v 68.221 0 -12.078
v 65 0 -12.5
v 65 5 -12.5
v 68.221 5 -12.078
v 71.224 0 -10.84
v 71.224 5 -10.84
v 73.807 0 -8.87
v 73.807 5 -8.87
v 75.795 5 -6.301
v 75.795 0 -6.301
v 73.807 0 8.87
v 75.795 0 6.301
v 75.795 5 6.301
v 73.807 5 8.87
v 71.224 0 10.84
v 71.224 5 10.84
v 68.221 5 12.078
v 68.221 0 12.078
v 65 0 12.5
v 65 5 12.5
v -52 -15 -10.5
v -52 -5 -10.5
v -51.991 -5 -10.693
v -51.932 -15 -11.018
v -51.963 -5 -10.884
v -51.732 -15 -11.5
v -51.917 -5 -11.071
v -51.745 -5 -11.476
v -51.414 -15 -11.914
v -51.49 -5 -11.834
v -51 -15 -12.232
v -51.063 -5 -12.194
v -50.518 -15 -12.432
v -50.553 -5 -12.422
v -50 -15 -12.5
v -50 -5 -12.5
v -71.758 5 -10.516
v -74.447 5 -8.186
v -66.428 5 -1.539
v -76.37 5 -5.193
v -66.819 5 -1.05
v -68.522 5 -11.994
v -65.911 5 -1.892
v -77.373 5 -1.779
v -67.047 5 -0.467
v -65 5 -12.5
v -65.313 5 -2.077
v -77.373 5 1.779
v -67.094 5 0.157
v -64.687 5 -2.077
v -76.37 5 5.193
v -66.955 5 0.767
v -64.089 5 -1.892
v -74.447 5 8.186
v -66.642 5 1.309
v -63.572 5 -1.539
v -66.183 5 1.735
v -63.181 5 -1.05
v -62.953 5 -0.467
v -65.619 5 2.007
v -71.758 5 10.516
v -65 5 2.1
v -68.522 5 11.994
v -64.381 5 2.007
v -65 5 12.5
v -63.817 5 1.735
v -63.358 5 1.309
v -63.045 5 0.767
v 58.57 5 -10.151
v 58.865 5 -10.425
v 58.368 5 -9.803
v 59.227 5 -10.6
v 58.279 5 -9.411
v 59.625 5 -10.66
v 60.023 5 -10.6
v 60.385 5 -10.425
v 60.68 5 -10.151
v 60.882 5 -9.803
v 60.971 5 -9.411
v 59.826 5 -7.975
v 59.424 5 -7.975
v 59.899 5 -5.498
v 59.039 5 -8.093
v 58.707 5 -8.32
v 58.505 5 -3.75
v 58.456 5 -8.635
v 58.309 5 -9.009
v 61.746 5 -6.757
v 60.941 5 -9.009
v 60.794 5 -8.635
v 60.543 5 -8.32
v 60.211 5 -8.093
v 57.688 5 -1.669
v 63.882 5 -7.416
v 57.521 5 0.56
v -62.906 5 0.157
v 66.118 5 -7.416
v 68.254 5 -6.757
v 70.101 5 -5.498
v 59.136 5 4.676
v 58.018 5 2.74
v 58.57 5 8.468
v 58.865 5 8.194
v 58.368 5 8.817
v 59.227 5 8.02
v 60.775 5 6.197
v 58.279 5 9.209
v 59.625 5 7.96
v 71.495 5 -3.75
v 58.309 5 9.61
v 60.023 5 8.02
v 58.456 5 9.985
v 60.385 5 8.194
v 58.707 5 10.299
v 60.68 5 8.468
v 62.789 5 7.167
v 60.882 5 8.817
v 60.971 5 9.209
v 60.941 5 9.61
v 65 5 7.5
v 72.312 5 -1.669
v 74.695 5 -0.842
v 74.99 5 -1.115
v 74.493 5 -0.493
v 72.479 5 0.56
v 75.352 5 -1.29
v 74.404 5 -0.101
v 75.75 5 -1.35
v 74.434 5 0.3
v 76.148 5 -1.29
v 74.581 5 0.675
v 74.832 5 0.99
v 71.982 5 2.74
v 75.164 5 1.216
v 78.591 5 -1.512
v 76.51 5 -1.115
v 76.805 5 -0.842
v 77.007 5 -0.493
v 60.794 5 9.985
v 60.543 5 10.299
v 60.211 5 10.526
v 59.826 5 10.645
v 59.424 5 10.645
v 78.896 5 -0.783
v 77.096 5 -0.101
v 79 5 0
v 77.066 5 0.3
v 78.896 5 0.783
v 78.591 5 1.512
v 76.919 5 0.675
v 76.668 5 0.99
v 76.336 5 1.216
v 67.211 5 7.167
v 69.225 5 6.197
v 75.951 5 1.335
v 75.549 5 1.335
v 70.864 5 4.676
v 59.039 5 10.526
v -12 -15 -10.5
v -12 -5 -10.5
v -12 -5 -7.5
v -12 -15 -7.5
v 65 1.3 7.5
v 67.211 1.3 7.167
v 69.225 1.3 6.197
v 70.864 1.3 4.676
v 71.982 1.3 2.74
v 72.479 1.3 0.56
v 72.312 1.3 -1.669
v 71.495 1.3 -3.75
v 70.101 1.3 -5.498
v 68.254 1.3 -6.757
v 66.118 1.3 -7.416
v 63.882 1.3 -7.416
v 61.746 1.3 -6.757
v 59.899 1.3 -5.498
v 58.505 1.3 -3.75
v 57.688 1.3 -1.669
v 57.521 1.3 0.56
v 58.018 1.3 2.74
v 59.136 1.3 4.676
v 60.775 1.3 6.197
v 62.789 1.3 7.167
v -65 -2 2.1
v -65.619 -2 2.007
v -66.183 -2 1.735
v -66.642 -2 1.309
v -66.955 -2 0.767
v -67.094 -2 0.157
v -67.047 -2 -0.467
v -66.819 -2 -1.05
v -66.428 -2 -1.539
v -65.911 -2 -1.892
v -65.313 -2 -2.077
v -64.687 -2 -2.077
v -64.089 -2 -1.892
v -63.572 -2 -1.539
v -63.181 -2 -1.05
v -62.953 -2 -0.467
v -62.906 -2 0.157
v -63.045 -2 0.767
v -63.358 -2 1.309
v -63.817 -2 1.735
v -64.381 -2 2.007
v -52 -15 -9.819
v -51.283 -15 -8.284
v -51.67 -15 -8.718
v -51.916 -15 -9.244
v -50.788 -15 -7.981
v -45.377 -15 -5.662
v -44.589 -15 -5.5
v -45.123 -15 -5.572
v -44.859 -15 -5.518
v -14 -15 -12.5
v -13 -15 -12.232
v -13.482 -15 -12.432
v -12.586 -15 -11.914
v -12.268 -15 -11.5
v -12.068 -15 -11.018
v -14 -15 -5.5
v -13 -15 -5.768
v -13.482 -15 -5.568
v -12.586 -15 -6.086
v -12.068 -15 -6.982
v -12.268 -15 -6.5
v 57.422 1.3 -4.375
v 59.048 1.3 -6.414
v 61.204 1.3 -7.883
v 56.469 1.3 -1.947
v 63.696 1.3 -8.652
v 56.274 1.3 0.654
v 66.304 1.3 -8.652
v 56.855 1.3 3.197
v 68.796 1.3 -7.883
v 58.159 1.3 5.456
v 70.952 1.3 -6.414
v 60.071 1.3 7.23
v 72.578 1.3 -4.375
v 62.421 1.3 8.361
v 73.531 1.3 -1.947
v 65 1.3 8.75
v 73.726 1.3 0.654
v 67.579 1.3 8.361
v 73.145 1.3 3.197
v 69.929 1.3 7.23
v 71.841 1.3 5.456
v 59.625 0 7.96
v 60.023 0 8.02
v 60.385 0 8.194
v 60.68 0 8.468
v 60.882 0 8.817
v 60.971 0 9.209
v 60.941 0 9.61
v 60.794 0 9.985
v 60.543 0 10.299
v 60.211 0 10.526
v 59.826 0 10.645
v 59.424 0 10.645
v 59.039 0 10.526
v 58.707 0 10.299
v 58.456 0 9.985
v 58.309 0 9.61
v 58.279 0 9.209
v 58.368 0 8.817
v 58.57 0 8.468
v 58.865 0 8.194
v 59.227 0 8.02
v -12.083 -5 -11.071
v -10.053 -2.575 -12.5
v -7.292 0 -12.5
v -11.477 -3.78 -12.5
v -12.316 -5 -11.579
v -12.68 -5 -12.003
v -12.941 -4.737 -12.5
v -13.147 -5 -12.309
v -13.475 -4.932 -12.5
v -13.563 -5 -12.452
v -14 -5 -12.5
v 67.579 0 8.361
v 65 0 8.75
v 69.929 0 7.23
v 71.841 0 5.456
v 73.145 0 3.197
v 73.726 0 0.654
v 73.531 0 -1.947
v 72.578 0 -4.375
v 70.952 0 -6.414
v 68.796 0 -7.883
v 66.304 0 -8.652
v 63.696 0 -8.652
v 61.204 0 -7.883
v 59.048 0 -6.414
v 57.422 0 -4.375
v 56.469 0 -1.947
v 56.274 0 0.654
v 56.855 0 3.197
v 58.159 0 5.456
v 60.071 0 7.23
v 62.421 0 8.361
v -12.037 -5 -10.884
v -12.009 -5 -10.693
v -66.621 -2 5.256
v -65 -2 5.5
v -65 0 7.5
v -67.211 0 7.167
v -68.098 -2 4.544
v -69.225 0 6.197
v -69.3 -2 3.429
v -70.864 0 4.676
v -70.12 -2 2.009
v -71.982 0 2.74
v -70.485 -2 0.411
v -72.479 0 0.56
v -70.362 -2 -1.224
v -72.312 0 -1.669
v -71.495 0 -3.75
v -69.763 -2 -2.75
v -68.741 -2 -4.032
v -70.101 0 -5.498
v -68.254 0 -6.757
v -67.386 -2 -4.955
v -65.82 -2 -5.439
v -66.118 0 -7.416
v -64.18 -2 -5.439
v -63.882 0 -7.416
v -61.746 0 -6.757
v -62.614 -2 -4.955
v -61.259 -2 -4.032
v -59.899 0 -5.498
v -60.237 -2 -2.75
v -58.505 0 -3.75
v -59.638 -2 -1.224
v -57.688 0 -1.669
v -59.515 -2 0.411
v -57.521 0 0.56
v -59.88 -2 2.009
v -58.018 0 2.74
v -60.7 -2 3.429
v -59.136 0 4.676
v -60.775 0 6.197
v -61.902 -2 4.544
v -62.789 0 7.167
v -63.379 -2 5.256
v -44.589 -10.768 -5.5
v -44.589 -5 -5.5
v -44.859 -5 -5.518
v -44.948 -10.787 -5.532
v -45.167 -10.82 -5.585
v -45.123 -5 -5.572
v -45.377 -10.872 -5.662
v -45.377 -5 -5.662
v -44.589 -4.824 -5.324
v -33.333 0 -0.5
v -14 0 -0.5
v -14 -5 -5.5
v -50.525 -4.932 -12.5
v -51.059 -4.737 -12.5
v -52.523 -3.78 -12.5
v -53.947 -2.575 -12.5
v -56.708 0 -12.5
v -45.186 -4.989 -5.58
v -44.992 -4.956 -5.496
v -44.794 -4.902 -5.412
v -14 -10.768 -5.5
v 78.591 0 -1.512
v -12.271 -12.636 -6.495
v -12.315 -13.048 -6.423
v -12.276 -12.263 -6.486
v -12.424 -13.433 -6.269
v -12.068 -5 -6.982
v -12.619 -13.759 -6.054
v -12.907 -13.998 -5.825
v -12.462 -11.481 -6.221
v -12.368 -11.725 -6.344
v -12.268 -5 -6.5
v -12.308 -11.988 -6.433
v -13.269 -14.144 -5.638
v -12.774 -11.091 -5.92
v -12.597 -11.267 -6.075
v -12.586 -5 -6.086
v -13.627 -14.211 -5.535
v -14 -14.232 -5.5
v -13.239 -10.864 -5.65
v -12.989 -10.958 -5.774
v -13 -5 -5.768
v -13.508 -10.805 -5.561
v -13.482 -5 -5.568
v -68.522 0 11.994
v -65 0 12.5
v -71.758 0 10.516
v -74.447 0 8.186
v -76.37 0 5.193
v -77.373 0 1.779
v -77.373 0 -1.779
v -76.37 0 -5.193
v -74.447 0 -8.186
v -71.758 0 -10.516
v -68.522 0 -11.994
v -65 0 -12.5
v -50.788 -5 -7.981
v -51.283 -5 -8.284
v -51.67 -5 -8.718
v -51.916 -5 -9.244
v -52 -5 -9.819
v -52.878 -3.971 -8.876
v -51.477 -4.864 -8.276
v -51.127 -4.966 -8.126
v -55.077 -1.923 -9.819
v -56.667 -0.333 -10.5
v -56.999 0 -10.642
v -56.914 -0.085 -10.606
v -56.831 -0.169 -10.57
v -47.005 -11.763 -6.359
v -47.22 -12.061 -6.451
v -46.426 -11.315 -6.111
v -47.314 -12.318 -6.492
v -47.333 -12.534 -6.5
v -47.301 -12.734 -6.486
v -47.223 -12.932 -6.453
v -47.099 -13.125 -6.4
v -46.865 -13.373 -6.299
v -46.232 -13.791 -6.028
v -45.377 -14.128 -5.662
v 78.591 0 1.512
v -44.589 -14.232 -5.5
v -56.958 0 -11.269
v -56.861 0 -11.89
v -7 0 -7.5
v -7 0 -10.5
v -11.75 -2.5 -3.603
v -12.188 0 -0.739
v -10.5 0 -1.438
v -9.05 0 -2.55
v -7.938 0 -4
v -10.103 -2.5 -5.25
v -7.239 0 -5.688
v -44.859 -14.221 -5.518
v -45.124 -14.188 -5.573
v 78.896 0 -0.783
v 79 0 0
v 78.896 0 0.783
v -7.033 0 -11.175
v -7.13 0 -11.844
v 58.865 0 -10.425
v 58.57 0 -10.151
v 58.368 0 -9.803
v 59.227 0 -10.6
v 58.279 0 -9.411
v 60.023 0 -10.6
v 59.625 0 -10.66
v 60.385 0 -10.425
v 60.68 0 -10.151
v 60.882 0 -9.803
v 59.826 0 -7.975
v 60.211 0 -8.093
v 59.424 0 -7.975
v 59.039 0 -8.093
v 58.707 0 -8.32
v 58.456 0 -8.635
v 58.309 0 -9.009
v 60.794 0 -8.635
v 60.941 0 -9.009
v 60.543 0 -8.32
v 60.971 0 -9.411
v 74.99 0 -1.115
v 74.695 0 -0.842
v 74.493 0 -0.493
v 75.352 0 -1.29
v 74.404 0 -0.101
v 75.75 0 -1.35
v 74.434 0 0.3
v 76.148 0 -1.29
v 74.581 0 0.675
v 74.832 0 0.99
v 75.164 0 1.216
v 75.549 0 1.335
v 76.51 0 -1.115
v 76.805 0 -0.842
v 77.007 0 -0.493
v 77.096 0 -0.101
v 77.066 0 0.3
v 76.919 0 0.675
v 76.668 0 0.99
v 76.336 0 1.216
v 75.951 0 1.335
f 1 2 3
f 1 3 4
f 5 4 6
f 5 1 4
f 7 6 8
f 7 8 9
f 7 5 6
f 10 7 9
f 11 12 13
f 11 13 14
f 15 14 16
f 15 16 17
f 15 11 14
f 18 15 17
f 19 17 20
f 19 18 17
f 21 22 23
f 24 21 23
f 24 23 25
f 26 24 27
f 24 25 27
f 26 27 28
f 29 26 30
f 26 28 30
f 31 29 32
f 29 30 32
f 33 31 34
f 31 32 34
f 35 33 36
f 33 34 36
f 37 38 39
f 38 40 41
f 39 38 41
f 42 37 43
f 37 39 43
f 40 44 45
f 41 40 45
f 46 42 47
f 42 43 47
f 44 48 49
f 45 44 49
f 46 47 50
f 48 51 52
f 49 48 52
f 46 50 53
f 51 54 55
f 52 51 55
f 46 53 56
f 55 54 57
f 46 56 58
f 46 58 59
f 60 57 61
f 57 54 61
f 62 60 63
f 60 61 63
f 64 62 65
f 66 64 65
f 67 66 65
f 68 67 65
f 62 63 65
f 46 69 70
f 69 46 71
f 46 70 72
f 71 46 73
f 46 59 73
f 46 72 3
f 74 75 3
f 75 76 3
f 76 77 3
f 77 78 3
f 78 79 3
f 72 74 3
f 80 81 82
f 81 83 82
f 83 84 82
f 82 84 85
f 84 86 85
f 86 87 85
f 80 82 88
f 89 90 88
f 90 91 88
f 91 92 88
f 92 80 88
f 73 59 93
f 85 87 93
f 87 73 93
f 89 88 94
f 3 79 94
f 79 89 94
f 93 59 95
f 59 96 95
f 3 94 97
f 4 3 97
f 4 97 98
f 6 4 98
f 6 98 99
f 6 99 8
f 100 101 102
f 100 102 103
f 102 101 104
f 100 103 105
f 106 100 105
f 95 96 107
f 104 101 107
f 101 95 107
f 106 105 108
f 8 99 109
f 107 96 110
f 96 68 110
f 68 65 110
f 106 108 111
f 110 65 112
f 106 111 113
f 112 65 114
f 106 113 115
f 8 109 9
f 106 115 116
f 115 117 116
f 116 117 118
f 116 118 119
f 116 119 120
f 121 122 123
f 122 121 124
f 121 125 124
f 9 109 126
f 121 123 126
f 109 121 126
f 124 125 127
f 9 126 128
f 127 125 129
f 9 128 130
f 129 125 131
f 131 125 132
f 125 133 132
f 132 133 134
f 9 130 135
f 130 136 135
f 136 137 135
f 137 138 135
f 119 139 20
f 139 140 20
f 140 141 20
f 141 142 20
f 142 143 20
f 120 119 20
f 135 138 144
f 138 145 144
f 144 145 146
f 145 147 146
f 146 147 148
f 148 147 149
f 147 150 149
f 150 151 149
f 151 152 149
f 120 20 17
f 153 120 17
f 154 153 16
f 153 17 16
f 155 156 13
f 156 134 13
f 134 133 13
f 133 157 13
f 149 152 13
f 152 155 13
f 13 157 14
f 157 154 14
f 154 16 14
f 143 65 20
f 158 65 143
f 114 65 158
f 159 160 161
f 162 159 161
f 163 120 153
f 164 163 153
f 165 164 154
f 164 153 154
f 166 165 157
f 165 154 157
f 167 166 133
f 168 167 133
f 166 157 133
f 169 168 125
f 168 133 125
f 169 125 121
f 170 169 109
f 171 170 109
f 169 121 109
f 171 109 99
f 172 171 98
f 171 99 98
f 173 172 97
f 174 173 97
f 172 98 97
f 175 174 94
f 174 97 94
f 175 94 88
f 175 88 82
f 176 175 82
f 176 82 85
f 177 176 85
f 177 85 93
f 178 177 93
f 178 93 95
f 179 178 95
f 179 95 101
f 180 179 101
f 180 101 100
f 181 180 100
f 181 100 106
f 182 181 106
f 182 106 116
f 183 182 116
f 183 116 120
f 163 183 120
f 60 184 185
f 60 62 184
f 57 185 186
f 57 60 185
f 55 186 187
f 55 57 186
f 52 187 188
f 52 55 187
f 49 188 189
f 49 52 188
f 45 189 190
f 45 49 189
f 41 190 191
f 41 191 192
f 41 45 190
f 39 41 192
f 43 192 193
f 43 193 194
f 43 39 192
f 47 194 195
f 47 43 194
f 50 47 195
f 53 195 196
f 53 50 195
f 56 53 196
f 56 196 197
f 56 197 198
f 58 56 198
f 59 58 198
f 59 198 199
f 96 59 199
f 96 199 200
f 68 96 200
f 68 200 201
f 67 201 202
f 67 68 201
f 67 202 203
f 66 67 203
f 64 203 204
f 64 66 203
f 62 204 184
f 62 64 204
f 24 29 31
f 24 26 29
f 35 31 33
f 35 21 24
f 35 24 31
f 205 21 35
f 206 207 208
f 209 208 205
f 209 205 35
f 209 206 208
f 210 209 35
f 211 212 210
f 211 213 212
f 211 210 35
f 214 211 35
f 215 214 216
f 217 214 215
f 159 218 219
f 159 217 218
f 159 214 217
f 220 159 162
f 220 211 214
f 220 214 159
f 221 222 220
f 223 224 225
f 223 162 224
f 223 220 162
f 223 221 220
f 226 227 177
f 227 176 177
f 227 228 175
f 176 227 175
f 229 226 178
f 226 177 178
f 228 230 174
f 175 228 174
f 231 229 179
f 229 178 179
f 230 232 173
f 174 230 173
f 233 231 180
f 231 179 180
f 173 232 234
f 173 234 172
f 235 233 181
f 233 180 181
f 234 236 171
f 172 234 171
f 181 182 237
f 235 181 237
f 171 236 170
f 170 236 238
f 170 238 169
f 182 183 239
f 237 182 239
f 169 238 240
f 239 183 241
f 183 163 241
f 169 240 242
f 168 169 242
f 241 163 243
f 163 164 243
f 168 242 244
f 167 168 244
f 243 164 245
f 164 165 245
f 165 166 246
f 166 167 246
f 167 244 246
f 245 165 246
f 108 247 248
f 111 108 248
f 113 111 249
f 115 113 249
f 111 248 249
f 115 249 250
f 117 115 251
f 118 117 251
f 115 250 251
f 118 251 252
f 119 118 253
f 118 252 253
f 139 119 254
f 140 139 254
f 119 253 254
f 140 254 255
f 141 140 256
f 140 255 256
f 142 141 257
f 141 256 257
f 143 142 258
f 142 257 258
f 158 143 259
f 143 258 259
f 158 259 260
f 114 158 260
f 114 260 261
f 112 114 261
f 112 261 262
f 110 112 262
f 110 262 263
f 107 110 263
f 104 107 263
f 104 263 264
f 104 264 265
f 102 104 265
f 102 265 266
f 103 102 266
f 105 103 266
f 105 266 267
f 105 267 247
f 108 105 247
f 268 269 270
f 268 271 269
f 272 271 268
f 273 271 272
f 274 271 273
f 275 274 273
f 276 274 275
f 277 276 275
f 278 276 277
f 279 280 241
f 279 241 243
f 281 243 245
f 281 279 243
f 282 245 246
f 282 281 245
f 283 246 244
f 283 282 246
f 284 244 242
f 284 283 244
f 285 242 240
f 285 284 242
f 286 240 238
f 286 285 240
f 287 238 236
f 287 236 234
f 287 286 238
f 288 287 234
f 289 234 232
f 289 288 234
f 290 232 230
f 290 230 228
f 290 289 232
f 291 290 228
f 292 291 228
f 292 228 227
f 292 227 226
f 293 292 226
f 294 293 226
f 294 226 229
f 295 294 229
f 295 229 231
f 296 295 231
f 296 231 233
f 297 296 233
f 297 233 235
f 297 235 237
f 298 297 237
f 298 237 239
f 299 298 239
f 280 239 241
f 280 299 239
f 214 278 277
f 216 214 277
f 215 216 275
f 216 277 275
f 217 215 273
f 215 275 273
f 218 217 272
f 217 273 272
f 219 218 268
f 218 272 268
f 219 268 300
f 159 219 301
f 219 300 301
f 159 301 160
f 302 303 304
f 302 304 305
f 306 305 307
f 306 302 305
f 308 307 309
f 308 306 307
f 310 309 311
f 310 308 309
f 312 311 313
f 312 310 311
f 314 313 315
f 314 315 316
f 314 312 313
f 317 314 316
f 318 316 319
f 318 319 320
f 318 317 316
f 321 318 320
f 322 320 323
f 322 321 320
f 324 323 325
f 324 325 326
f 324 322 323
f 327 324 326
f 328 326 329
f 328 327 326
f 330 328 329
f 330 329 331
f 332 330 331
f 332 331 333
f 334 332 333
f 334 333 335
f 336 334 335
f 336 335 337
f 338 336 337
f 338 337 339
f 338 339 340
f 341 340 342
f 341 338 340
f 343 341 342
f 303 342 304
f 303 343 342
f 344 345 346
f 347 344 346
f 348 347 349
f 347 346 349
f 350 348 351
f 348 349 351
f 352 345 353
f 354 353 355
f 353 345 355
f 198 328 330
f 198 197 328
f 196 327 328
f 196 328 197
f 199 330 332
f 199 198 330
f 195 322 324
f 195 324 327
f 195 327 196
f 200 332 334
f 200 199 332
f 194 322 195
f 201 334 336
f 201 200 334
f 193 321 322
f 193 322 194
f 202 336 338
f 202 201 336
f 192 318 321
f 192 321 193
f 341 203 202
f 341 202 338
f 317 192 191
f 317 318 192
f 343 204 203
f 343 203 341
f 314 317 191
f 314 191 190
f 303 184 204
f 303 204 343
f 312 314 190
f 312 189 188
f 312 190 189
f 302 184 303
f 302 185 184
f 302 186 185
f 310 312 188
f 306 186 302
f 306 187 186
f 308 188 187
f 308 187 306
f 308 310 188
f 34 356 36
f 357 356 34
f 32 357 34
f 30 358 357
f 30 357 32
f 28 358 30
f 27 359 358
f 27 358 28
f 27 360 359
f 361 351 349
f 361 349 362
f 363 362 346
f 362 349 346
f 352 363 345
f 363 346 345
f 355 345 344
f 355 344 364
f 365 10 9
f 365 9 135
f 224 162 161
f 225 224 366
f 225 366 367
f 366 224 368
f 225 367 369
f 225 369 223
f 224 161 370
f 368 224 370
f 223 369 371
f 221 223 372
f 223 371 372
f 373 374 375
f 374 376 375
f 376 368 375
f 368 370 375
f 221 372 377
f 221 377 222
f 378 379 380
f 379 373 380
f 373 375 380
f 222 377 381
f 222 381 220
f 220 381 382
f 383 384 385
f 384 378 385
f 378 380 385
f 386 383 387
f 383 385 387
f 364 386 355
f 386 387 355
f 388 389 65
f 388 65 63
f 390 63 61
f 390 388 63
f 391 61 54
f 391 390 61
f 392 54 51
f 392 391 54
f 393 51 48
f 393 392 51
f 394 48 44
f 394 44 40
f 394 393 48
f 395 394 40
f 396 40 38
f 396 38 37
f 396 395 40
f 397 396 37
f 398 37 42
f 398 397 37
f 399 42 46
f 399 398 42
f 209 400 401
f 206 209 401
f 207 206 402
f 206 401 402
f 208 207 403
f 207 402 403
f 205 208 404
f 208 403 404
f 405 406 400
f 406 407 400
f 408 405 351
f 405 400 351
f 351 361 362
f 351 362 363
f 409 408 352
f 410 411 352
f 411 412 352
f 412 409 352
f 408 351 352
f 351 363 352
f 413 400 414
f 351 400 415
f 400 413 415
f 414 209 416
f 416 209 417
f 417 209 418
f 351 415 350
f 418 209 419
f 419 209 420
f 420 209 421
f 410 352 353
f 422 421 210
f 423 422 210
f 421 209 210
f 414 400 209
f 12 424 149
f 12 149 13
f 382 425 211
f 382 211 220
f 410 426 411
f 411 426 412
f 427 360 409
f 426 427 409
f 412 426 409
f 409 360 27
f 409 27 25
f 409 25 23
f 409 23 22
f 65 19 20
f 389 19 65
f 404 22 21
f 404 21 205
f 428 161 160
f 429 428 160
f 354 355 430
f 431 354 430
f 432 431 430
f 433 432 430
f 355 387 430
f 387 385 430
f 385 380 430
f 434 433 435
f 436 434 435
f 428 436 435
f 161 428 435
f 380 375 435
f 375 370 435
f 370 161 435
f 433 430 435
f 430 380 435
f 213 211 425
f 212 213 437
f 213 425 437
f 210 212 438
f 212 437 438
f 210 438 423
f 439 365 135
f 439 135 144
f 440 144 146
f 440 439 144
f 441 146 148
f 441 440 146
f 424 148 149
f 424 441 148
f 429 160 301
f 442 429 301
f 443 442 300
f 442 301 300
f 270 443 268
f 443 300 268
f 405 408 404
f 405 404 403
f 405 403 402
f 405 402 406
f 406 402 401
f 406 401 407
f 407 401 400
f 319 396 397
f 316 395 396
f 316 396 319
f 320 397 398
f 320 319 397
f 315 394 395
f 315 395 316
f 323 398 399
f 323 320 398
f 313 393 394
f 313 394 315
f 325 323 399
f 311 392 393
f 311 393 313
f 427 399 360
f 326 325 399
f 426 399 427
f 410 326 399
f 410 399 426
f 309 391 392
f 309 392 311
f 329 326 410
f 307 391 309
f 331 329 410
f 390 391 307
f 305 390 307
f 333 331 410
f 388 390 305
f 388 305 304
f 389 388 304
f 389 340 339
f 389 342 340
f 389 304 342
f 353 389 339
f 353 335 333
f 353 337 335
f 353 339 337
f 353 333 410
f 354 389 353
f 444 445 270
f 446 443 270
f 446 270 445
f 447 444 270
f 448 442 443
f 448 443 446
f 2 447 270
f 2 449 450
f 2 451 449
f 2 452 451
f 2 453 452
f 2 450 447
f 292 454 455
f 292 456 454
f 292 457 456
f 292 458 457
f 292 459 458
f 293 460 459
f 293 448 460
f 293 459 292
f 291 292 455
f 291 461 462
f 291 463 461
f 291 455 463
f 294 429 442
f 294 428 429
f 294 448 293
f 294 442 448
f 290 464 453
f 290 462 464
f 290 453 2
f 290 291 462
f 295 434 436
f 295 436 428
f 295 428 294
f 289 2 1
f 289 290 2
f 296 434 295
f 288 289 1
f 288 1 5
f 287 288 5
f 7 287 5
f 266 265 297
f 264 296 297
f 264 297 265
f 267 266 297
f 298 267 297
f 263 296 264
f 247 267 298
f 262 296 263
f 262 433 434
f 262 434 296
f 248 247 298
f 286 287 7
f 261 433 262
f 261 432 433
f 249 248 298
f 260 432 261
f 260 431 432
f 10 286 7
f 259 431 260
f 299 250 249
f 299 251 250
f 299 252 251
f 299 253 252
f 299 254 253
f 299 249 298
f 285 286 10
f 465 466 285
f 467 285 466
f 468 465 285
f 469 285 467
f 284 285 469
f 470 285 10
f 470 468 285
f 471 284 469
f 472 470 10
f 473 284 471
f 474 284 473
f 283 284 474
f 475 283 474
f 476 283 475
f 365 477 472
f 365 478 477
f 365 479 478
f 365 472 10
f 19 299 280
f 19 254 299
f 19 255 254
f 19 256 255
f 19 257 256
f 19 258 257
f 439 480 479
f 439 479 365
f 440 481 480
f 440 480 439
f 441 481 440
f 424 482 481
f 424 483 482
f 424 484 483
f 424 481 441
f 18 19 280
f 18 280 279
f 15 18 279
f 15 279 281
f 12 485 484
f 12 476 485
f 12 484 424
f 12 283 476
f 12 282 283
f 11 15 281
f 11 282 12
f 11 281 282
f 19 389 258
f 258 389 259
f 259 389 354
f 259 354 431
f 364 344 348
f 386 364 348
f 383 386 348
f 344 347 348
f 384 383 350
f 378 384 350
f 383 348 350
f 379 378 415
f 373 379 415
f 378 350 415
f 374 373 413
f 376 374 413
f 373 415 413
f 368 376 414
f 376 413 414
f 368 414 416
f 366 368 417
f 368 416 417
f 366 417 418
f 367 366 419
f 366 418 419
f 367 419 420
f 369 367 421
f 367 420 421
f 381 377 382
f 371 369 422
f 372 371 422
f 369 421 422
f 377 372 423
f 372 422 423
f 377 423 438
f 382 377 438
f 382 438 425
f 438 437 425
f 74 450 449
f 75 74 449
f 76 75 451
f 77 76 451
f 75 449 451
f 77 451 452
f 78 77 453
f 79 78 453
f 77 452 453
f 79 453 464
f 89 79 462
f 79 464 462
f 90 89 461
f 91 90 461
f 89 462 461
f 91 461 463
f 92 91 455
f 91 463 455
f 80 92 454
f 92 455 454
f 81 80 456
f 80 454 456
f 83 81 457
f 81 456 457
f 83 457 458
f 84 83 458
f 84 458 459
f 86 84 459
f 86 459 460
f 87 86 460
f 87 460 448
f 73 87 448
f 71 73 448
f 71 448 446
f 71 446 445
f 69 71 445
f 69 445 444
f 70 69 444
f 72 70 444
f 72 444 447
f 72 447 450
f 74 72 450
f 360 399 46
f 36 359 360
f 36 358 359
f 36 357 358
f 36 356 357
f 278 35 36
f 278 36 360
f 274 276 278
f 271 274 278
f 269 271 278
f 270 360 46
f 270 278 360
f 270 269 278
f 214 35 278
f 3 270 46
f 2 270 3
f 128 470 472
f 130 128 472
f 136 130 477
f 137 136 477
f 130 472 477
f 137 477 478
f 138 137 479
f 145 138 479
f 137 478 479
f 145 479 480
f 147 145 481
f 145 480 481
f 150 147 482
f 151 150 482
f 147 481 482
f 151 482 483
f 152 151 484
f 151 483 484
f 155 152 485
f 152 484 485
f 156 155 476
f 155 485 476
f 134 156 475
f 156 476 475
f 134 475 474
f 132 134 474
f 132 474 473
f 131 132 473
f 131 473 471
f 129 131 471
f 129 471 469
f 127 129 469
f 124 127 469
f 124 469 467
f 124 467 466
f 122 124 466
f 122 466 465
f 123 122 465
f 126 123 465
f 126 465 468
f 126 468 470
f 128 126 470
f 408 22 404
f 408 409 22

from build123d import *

# Parameters (mm, degrees)
EXTRUDE_1_DEPTH     = 5
EXTRUDE_5_DEPTH     = 5
CUT_EXTRUDE_2_REACH = 82.139
SKETCH_7_R          = 7.5
SKETCH_8_R          = 8.75
CUT_EXTRUDE_3_DEPTH = 1.3
CUT_EXTRUDE_4_REACH = 82.139
SKETCH_9_R          = 1.35
CUT_EXTRUDE_5_REACH = 82.139
SKETCH_12_R         = 2.1
SKETCH_14_W         = 40
SKETCH_14_H         = 7
EXTRUDE_6_DEPTH     = 15
CHAMFER_1_SIZE      = 7
CHAMFER_1_SIZE2     = 3
CUT_EXTRUDE_6_REACH = 134.447
SKETCH_15_R         = 2
FILLET_3_R          = 2
CHAMFER_2_SIZE      = 5
CUT_EXTRUDE_7_DEPTH = 15
SKETCH_17_R         = 7.5
SKETCH_17_R_2       = 2.1
EXTRUDE_7_DEPTH     = 2
CHAMFER_3_SIZE      = 2


# Some blends are built 0.0001 mm under size
with BuildPart() as part:
    # 草图1 → 凸台-拉伸1 (new body)
    with BuildSketch(Plane(origin=(0, 0, 0), x_dir=(1, 0, 0), z_dir=(0, 1, 0))):
        with BuildLine():
            Line((-65, 12.5), (65, 12.5))
            ThreePointArc((65, 12.5), (77.5, 0), (65, -12.5))
            Line((65, -12.5), (-65, -12.5))
            ThreePointArc((-65, -12.5), (-77.5, 0), (-65, 12.5))
        make_face()
    extrude(amount=EXTRUDE_1_DEPTH)

    # 草图10 → 凸台-拉伸5 (add)
    with BuildSketch(Plane.XZ):
        with BuildLine():
            Line((75.795454545, -6.301441197), (78.590909091, -1.512345887))
            ThreePointArc((78.590909091, -1.512345887), (79, 0), (78.590909091, 1.512345887))
            Line((78.590909091, 1.512345887), (75.795454545, 6.301441197))
            Line((75.795454545, 6.301441197), (75.795454545, -6.301441197))
        make_face()
    extrude(amount=-EXTRUDE_5_DEPTH)

    # 草图7 → 切除-拉伸2 (cut, up to next)
    with BuildSketch(Plane(origin=(0, 5, 0), x_dir=(1, 0, 0), z_dir=(0, 1, 0)), mode=Mode.PRIVATE) as cut_extrude_2_sk1:
        with Locations(Location((65, 0, 0), (0, 0, 270))):
            Circle(SKETCH_7_R)
    cut_extrude_2_tool1 = extrude(cut_extrude_2_sk1.sketch, amount=-CUT_EXTRUDE_2_REACH, mode=Mode.PRIVATE) & part.part
    add(cut_extrude_2_tool1.solids().sort_by_distance((65, 5, 0))[0], mode=Mode.SUBTRACT)

    # 草图8 → 切除-拉伸3 (cut)
    with BuildSketch(Plane(origin=(0, 0, 0), x_dir=(1, 0, 0), z_dir=(0, 1, 0))):
        with Locations(Location((65, 0, 0), (0, 0, 270))):
            Circle(SKETCH_8_R)
    extrude(amount=CUT_EXTRUDE_3_DEPTH, mode=Mode.SUBTRACT)

    # 草图9 → 切除-拉伸4 (cut, up to next)
    with BuildSketch(Plane.XZ, mode=Mode.PRIVATE) as cut_extrude_4_sk1:
        with Locations(Location((59.625, 9.309773091, 0), (0, 0, 270))):
            Circle(SKETCH_9_R)
    cut_extrude_4_tool1 = extrude(cut_extrude_4_sk1.sketch, amount=-CUT_EXTRUDE_4_REACH, mode=Mode.PRIVATE) & part.part
    # 草图9 → 切除-拉伸4 (cut, up to next)
    with BuildSketch(Plane.XZ, mode=Mode.PRIVATE) as cut_extrude_4_sk2:
        with Locations(Location((75.75, 0, 0), (0, 0, 270))):
            Circle(SKETCH_9_R)
    cut_extrude_4_tool2 = extrude(cut_extrude_4_sk2.sketch, amount=-CUT_EXTRUDE_4_REACH, mode=Mode.PRIVATE) & part.part
    # 草图9 → 切除-拉伸4 (cut, up to next)
    with BuildSketch(Plane.XZ, mode=Mode.PRIVATE) as cut_extrude_4_sk3:
        with Locations(Location((59.625, -9.309773091, 0), (0, 0, 270))):
            Circle(SKETCH_9_R)
    cut_extrude_4_tool3 = extrude(cut_extrude_4_sk3.sketch, amount=-CUT_EXTRUDE_4_REACH, mode=Mode.PRIVATE) & part.part
    add(cut_extrude_4_tool1.solids().sort_by_distance((59.625, 0, 9.309773))[0], mode=Mode.SUBTRACT)
    add(cut_extrude_4_tool2.solids().sort_by_distance((75.75, 0, 0))[0], mode=Mode.SUBTRACT)
    add(cut_extrude_4_tool3.solids().sort_by_distance((59.625, 0, -9.309773))[0], mode=Mode.SUBTRACT)

    # 草图12 → 切除-拉伸5 (cut, up to next)
    with BuildSketch(Plane(origin=(0, 5, 0), x_dir=(1, 0, 0), z_dir=(0, 1, 0)), mode=Mode.PRIVATE) as cut_extrude_5_sk1:
        with Locations(Location((-65, 0, 0), (0, 0, 270))):
            Circle(SKETCH_12_R)
    cut_extrude_5_tool1 = extrude(cut_extrude_5_sk1.sketch, amount=-CUT_EXTRUDE_5_REACH, mode=Mode.PRIVATE) & part.part
    add(cut_extrude_5_tool1.solids().sort_by_distance((-65, 5, 0))[0], mode=Mode.SUBTRACT)

    # 草图14 → 凸台-拉伸6 (add)
    with BuildSketch(Plane.XZ):
        with Locations((-32, -9)):
            Rectangle(SKETCH_14_W, SKETCH_14_H)
    extrude(amount=EXTRUDE_6_DEPTH)

    # 倒角1
    chamfer_1_edges = [part.edges().sort_by_distance(p)[0] for p in [
        (-52, -7.5, -5.5),
    ]]
    chamfer_1_side = [part.faces().sort_by_distance(p)[0] for p in [
        (-32, -7.5, -5.5),
    ]]
    chamfer(chamfer_1_edges, length=CHAMFER_1_SIZE, length2=CHAMFER_1_SIZE2, reference=chamfer_1_side[0])

    # 草图15 → 切除-拉伸6 (cut, up to next)
    with BuildSketch(Plane.ZY.offset(52), mode=Mode.PRIVATE) as cut_extrude_6_sk1:
        with Locations((-4.5, -12.5)):
            Circle(SKETCH_15_R)
    cut_extrude_6_tool1 = extrude(cut_extrude_6_sk1.sketch, amount=-CUT_EXTRUDE_6_REACH, mode=Mode.PRIVATE) & part.part
    add(cut_extrude_6_tool1.solids().sort_by_distance((-52, -12.5, -4.5))[0], mode=Mode.SUBTRACT)

    # 圆角3
    # the kernel refuses this fillet: 2 mm, written as the material it takes off along each edge
    with BuildSketch(Plane(origin=(-52, 0, -8.5), x_dir=(0.9191450300180579, 0, 0.39391929857916774), z_dir=(0, -1, 0))) as fillet_3_piece_1:
        with BuildLine():
            CenterArc((FILLET_3_R * 0.659396157981, -FILLET_3_R), FILLET_3_R, 90, 66.801409486)
            Line((-FILLET_3_R * 0.259748872037, -FILLET_3_R * 0.606080701421), (0, 0))
            Line((0, 0), (FILLET_3_R * 0.659396157981, 0))
        make_face()
    extrude(amount=18.29698079, mode=Mode.SUBTRACT)
    with BuildSketch(Plane(origin=(-52, 0, -12.5), x_dir=(0, 0, 1), z_dir=(0, -1, 0))) as fillet_3_piece_2:
        with BuildLine():
            CenterArc((FILLET_3_R, -FILLET_3_R), FILLET_3_R, 90, 90)
            Line((0, -FILLET_3_R), (0, 0))
            Line((0, 0), (FILLET_3_R, 0))
        make_face()
    extrude(amount=20, mode=Mode.SUBTRACT)
    with BuildSketch(Plane(origin=(-45, -13.205762298, -5.5), x_dir=(-0.9191450300180575, 0, -0.3939192985791687), z_dir=(0, -1, 0))) as fillet_3_piece_3:
        with BuildLine():
            CenterArc((FILLET_3_R * 0.205257701955, FILLET_3_R), FILLET_3_R, 246.801409486, 23.198590514)
            Line((-FILLET_3_R * 0.188661596625, FILLET_3_R * 0.0808549699819), (0, 0))
            Line((0, 0), (FILLET_3_R * 0.205257701955, 0))
        make_face()
    extrude(amount=2.820526212, mode=Mode.SUBTRACT)
    with BuildSketch(Plane(origin=(-45, 0, -5.5), x_dir=(1, 0, 0), z_dir=(0, -1, 0))) as fillet_3_piece_4:
        with BuildLine():
            CenterArc((FILLET_3_R * 0.205257701955, -FILLET_3_R), FILLET_3_R, 90, 23.198590514)
            Line((-FILLET_3_R * 0.188661596625, -FILLET_3_R * 0.0808549699819), (0, 0))
            Line((0, 0), (FILLET_3_R * 0.205257701955, 0))
        make_face()
    extrude(amount=11.794237702, mode=Mode.SUBTRACT)
    with BuildSketch(Plane(origin=(-12, 0, -5.5), x_dir=(-1, 0, 0), z_dir=(0, -1, 0))) as fillet_3_piece_5:
        with BuildLine():
            CenterArc((FILLET_3_R, FILLET_3_R), FILLET_3_R, 180, 90)
            Line((0, FILLET_3_R), (0, 0))
            Line((0, 0), (FILLET_3_R, 0))
        make_face()
    extrude(amount=15.767949192, mode=Mode.SUBTRACT)
    with BuildSketch(Plane(origin=(-12, -9.232050808, -5.5), x_dir=(0, 0, -1), z_dir=(0, -1, 0))) as fillet_3_piece_6:
        with BuildLine():
            CenterArc((FILLET_3_R, -FILLET_3_R), FILLET_3_R, 90, 90)
            Line((0, -FILLET_3_R), (0, 0))
            Line((0, 0), (FILLET_3_R, 0))
        make_face()
    extrude(amount=10.767949192, mode=Mode.SUBTRACT)
    with BuildSketch(Plane(origin=(-12, 0, -12.5), x_dir=(0, 0, 1), z_dir=(0, -1, 0))) as fillet_3_piece_7:
        with BuildLine():
            CenterArc((FILLET_3_R, FILLET_3_R), FILLET_3_R, 180, 90)
            Line((0, FILLET_3_R), (0, 0))
            Line((0, 0), (FILLET_3_R, 0))
        make_face()
    extrude(amount=20, mode=Mode.SUBTRACT)

    # 倒角2
    chamfer_2_edges = [part.edges().sort_by_distance(p)[0] for p in [
        (-29.294742298, 0, -5.5),
        (-12, 0, -9),
        (-51.669682184, 0, -8.717810298),
        (-51.414213562, 0, -11.914213562),
        (-44.991616341, 0, -5.540844554),
        (-12.585786438, 0, -6.085786438),
        (-12.585786438, 0, -11.914213562),
        (-52, 0, -10.159396158),
        (-48.082580895, 0, -6.821106098),
    ]]
    chamfer(chamfer_2_edges, length=CHAMFER_2_SIZE)

    # 草图16 → 切除-拉伸7 (cut)
    with BuildSketch(Plane.XZ.offset(15)):
        Polygon((-61.333333333, -12.5), (-33.333333333, -0.5), (-61.333333333, -0.5), align=None)
    extrude(amount=-CUT_EXTRUDE_7_DEPTH, mode=Mode.SUBTRACT)

    # 草图17 → 凸台-拉伸7 (add)
    with BuildSketch(Plane.XZ):
        with Locations(Location((-65, 0, 0), (0, 0, 90))):
            Circle(SKETCH_17_R)
        with Locations(Location((-65, 0, 0), (0, 0, 90))):
            Circle(SKETCH_17_R_2, mode=Mode.SUBTRACT)
    extrude(amount=EXTRUDE_7_DEPTH)

    # 倒角3
    chamfer_3_edges = [part.edges().sort_by_distance(p)[0] for p in [
        (-65, -2, -7.5),
    ]]
    chamfer(chamfer_3_edges, length=CHAMFER_3_SIZE - 0.0001)  # a hair under: the kernel refuses the full size


solid = part.part
